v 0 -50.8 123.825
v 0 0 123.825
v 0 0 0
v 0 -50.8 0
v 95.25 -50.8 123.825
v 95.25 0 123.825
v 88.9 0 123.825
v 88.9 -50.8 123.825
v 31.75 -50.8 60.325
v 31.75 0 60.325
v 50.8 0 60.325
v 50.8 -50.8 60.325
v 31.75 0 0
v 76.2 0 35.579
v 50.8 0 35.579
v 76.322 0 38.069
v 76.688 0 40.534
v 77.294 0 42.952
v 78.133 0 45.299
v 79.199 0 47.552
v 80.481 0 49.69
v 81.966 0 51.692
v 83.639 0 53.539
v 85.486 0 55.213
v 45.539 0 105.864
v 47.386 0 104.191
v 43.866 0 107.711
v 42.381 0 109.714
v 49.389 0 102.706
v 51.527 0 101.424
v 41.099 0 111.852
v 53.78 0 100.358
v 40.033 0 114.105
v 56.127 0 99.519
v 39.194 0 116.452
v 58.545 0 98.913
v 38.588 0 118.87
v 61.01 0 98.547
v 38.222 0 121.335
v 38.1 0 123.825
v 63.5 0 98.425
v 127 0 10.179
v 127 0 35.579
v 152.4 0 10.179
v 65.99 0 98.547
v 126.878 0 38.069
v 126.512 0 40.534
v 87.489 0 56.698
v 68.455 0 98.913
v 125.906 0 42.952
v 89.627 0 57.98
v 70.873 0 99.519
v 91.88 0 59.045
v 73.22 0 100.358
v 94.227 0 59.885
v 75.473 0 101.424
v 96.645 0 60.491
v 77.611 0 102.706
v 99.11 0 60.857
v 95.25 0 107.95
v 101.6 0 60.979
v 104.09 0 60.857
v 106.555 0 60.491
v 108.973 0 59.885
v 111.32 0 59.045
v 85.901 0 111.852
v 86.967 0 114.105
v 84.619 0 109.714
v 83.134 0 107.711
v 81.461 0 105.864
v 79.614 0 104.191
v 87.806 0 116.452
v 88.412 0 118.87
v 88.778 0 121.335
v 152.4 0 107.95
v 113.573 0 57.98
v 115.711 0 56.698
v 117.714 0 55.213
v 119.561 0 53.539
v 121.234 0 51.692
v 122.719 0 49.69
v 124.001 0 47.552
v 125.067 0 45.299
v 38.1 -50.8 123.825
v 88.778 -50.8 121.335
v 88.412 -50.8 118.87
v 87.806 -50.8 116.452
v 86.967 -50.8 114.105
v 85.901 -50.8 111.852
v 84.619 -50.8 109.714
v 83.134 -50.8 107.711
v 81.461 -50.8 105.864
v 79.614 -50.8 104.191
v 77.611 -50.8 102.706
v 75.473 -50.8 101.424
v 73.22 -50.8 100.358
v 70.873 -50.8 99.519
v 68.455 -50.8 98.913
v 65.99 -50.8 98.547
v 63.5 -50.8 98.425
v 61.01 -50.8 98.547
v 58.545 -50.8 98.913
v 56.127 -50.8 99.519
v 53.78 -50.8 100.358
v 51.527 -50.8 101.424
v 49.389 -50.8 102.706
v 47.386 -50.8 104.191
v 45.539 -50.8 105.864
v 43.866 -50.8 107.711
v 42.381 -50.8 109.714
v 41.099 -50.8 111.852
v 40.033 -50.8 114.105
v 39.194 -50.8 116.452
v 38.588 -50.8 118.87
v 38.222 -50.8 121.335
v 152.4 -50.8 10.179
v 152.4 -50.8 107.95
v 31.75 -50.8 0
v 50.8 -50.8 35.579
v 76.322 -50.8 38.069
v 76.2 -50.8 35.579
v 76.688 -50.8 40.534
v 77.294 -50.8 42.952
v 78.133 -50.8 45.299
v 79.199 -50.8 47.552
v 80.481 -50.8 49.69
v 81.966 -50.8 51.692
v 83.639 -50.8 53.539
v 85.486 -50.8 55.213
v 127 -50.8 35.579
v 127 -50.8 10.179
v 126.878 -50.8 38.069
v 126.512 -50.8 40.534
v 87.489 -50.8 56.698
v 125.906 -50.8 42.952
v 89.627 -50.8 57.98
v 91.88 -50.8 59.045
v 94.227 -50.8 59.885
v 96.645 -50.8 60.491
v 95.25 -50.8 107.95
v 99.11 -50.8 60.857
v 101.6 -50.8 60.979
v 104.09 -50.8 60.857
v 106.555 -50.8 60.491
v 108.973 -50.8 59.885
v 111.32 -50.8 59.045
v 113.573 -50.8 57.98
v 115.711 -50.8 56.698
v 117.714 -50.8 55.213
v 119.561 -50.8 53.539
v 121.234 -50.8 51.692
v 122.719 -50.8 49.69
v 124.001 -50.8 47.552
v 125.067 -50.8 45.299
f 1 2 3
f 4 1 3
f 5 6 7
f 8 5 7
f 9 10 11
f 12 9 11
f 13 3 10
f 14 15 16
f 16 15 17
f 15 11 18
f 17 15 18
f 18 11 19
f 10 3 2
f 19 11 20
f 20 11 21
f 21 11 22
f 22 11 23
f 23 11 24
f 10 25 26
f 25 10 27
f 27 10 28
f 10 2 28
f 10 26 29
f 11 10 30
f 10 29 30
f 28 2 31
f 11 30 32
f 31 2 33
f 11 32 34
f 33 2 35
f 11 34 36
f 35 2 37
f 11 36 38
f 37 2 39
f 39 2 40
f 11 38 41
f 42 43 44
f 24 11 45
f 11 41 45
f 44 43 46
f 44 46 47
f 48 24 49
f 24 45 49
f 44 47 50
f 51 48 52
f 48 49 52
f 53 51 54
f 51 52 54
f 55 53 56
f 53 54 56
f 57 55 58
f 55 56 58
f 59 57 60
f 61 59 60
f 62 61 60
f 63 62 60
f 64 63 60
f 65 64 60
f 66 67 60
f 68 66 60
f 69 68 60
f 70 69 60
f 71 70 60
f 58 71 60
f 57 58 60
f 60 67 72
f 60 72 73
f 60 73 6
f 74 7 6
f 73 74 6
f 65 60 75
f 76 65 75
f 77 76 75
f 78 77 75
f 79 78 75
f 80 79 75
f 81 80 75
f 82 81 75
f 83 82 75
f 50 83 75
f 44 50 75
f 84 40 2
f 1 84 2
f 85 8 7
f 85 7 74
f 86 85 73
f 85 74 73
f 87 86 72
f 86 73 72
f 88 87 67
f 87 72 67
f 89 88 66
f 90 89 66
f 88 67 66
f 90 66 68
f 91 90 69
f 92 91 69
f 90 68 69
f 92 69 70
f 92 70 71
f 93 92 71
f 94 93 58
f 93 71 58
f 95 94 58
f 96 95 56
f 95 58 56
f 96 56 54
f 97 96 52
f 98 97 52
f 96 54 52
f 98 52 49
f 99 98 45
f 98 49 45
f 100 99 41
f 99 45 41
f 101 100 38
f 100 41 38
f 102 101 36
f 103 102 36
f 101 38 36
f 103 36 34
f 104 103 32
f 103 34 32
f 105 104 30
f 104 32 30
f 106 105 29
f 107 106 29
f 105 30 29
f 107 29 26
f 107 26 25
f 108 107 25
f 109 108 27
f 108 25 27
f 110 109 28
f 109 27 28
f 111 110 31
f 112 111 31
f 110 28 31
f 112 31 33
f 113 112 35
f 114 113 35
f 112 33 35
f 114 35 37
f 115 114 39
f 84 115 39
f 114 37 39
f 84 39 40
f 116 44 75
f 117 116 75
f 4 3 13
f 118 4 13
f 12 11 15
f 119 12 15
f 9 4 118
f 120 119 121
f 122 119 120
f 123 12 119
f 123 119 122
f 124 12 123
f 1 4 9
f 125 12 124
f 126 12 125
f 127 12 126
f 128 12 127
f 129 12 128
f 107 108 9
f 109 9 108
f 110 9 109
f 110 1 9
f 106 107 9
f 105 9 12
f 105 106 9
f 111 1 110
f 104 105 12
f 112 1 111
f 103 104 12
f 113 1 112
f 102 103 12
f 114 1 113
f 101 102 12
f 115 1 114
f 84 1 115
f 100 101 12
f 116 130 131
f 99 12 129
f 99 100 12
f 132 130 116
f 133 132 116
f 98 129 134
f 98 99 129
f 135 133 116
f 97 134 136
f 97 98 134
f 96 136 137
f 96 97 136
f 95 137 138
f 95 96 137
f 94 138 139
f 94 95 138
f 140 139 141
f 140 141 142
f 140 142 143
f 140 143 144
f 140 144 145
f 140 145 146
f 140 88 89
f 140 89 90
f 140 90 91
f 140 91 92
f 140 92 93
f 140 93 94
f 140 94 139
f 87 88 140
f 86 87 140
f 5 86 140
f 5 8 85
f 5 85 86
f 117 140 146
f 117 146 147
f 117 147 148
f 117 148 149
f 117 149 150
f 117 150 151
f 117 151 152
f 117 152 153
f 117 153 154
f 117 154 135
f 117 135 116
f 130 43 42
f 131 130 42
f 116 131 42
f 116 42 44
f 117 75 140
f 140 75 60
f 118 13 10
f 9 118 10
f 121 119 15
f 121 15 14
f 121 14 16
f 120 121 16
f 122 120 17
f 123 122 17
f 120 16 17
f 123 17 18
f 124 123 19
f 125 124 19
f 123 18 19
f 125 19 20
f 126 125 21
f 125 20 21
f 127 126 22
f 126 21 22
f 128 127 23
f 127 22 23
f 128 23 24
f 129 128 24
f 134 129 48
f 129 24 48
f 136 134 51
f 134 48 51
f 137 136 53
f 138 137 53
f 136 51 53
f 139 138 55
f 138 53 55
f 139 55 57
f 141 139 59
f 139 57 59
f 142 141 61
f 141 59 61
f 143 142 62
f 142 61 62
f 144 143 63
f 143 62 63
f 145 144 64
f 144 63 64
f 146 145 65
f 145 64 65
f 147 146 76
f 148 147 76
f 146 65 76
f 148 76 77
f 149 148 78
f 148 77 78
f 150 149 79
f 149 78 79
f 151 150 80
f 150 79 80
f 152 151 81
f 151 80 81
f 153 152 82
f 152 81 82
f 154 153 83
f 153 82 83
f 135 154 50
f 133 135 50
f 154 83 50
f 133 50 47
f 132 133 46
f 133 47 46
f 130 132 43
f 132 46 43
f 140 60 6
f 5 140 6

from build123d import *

# Parameters (mm, degrees)
F1_DEPTH = 50.8


with BuildPart() as f1:
    # F0 (on Front) → F1 (new body)
    with BuildSketch(Plane.XZ):
        with BuildLine():
            Line((0, 123.825), (0, 0))
            Line((0, 0), (31.75, 0))
            Line((31.75, 0), (31.75, 60.325))
            Line((31.75, 60.325), (50.8, 60.325))
            Line((50.8, 60.325), (50.8, 35.57891))
            Line((50.8, 35.57891), (76.2, 35.57891))
            ThreePointArc((76.2, 35.57891), (101.6, 60.97891), (127, 35.57891))
            Line((127, 35.57891), (127, 10.17891))
            Line((127, 10.17891), (152.4, 10.17891))
            Line((152.4, 10.17891), (152.4, 107.95))
            Line((152.4, 107.95), (95.25, 107.95))
            Line((95.25, 107.95), (95.25, 123.825))
            Line((95.25, 123.825), (88.9, 123.825))
            ThreePointArc((88.9, 123.825), (63.5, 98.425), (38.1, 123.825))
            Line((38.1, 123.825), (0, 123.825))
        make_face()
    extrude(amount=F1_DEPTH)


solid = f1.part
